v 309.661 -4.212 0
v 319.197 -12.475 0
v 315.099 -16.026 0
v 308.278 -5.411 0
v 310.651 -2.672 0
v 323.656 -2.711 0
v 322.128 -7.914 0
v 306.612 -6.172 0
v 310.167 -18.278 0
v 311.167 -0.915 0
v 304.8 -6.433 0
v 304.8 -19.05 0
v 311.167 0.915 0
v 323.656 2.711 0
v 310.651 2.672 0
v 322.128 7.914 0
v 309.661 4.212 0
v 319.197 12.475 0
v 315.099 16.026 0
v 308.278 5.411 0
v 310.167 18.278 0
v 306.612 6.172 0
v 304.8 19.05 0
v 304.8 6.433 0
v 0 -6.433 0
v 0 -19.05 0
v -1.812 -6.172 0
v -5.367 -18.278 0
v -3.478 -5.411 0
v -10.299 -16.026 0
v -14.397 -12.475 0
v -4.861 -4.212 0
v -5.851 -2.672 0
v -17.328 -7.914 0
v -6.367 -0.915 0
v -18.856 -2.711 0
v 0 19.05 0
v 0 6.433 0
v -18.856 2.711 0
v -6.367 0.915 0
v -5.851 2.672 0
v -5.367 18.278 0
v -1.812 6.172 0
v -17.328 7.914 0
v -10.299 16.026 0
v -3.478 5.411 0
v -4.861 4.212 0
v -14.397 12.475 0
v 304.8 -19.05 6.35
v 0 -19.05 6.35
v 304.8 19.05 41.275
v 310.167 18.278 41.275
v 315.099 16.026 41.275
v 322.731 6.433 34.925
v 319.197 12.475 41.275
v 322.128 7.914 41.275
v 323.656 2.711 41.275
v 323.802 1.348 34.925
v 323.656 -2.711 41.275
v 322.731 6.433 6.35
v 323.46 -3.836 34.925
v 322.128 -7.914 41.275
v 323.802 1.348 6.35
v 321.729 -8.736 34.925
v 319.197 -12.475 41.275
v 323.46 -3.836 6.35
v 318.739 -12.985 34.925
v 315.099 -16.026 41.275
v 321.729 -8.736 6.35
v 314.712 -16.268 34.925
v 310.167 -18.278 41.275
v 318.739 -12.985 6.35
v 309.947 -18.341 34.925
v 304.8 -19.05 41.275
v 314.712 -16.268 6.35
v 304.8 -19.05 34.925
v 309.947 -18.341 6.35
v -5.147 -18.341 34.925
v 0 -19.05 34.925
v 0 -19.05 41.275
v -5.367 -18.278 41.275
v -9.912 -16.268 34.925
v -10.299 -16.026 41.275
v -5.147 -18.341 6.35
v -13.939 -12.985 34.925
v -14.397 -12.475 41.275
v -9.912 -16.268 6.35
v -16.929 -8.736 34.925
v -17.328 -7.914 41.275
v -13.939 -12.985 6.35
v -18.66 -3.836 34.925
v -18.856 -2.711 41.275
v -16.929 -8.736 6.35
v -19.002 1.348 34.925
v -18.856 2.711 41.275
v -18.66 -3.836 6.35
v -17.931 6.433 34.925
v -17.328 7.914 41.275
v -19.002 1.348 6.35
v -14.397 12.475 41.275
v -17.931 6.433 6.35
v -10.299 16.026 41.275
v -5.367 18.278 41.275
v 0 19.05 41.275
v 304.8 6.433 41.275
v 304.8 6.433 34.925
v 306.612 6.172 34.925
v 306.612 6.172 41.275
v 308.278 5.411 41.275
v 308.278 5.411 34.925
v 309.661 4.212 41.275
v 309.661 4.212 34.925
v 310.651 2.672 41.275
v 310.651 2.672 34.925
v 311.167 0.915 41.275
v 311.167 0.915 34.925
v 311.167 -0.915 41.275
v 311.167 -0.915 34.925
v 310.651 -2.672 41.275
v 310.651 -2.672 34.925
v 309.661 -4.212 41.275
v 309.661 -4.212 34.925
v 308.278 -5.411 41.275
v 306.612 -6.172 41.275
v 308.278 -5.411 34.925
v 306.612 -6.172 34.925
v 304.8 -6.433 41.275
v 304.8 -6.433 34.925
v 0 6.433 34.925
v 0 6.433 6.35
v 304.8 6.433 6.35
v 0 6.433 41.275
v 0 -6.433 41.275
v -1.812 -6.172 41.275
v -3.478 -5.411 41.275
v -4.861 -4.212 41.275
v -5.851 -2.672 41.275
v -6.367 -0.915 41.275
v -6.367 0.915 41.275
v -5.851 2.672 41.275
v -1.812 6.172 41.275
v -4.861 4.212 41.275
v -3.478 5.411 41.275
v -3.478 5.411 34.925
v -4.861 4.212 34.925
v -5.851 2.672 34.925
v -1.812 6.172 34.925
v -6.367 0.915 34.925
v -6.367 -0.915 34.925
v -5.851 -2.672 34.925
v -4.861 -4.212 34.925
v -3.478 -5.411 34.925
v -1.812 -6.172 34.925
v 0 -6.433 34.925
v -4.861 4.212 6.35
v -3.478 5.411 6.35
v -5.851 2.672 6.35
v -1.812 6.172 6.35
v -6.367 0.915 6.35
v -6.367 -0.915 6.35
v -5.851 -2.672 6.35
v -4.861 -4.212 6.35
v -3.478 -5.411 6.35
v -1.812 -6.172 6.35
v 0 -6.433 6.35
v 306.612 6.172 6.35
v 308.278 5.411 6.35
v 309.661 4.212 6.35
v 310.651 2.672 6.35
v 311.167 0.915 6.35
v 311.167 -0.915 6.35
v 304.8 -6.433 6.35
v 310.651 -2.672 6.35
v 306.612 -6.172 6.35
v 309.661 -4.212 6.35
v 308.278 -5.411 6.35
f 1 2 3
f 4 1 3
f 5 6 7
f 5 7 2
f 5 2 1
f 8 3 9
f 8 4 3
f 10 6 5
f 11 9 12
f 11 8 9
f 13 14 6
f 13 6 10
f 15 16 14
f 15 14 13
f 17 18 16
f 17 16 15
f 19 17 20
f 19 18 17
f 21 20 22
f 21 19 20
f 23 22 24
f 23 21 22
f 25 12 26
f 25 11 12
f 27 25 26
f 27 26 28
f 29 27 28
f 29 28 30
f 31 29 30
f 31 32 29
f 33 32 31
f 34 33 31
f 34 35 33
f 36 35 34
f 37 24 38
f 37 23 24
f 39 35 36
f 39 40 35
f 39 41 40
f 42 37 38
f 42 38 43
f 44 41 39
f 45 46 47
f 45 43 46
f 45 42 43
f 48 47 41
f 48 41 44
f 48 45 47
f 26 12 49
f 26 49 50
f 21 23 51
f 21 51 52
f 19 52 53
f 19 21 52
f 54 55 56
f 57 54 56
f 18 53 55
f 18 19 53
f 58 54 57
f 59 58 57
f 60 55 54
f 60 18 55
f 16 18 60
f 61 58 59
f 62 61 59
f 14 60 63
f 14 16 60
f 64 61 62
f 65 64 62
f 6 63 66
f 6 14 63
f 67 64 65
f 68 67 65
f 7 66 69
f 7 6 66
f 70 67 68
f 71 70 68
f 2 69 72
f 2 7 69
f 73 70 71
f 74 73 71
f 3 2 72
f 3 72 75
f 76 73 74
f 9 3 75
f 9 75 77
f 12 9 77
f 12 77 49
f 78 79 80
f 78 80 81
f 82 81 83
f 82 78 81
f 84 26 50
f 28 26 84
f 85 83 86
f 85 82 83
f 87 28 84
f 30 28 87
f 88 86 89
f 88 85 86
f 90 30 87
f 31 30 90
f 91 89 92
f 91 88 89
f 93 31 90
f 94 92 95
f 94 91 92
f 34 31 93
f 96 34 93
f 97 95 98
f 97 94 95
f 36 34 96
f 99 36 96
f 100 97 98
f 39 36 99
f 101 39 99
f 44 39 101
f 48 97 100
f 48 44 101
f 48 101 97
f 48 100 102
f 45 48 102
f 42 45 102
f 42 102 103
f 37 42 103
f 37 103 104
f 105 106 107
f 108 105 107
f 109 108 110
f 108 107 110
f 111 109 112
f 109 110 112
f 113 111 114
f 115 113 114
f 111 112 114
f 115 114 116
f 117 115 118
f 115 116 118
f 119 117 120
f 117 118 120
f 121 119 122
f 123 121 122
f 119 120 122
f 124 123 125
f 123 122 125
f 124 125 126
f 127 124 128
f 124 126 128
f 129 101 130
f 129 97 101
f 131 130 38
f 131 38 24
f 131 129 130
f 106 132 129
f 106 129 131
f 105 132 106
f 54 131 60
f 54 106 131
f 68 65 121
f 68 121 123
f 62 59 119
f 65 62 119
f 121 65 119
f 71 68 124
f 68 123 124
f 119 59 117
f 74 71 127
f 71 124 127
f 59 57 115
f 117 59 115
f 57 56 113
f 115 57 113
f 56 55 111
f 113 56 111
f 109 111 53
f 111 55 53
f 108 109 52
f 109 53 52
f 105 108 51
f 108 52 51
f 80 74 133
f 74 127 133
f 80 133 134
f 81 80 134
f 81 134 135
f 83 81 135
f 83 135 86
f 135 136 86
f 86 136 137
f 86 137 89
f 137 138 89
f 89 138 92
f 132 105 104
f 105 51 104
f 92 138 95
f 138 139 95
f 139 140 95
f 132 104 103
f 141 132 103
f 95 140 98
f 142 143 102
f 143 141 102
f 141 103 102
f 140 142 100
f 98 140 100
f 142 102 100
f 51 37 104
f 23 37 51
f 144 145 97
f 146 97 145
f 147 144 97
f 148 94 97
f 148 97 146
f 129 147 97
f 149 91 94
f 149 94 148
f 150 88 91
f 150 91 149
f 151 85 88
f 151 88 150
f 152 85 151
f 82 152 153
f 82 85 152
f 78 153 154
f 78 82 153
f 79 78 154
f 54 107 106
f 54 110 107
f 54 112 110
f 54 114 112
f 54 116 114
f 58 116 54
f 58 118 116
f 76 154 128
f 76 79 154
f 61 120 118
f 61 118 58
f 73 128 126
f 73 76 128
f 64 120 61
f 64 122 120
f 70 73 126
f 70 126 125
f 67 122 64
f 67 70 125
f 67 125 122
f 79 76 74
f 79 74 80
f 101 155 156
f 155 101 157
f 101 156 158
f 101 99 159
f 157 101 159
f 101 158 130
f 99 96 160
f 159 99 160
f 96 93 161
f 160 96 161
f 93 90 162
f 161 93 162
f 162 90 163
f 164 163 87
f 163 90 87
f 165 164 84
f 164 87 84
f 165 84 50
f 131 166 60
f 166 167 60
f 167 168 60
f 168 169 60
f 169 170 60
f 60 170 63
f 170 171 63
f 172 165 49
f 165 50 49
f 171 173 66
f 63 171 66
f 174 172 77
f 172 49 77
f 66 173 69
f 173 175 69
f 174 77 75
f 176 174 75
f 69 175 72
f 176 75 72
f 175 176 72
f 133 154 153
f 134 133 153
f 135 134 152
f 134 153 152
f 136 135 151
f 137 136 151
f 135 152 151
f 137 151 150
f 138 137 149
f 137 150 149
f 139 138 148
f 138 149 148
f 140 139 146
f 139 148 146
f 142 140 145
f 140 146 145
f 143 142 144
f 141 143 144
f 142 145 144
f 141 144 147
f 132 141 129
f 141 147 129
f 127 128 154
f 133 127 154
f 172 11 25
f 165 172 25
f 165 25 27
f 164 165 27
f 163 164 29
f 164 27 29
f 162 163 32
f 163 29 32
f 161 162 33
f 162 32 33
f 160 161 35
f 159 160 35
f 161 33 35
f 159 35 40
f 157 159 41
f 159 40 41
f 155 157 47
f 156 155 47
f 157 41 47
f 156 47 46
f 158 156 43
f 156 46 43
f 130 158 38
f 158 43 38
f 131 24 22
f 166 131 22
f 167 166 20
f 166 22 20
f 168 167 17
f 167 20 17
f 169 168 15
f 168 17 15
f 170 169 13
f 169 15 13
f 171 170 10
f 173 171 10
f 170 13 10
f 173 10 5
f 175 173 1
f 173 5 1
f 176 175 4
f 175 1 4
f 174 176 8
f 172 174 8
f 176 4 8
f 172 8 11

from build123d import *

# Parameters (mm, degrees)
BOSS_EXTRUDE1_DEPTH = 41.275
CUT_EXTRUDE1_REACH  = 330.685
SKETCH2_W           = 342.9
SKETCH2_H           = 28.575


with BuildPart() as part:
    # Sketch1 → Boss-Extrude1 (new body)
    with BuildSketch(Plane.XY):
        with BuildLine():
            Line((0, 19.05), (304.8, 19.05))
            ThreePointArc((304.8, 19.05), (323.85, 0), (304.8, -19.05))
            Line((304.8, -19.05), (0, -19.05))
            ThreePointArc((0, -19.05), (-19.05, 0), (0, 19.05))
        make_face()
        with BuildLine():
            Line((0, 6.43255), (304.8, 6.43255))
            ThreePointArc((304.8, 6.43255), (311.23255, 0), (304.8, -6.43255))
            Line((304.8, -6.43255), (0, -6.43255))
            ThreePointArc((0, -6.43255), (-6.43255, 0), (0, 6.43255))
        make_face(mode=Mode.SUBTRACT)
    extrude(amount=BOSS_EXTRUDE1_DEPTH)

    # Cut-Extrude1: up to this face of the body (flat: up to its plane)
    cut_extrude1_end = Plane(part.part.faces().sort_by_distance((152.4, 6.43255, 20.6375))[0])
    # Sketch2 → Cut-Extrude1 (cut, up to the picked face)
    with BuildSketch(Plane.XZ.offset(19.05), mode=Mode.PRIVATE) as cut_extrude1_sk1:
        with Locations((152.4, 20.6375)):
            Rectangle(SKETCH2_W, SKETCH2_H)
    cut_extrude1_tool1 = split(extrude(cut_extrude1_sk1.sketch, amount=-CUT_EXTRUDE1_REACH, mode=Mode.PRIVATE), bisect_by=cut_extrude1_end, keep=Keep.BOTH, mode=Mode.PRIVATE)
    add(cut_extrude1_tool1.solids().sort_by(Axis((152.4, -19.05, 20.6375), (0, 1, 0)))[0], mode=Mode.SUBTRACT)


solid = part.part
